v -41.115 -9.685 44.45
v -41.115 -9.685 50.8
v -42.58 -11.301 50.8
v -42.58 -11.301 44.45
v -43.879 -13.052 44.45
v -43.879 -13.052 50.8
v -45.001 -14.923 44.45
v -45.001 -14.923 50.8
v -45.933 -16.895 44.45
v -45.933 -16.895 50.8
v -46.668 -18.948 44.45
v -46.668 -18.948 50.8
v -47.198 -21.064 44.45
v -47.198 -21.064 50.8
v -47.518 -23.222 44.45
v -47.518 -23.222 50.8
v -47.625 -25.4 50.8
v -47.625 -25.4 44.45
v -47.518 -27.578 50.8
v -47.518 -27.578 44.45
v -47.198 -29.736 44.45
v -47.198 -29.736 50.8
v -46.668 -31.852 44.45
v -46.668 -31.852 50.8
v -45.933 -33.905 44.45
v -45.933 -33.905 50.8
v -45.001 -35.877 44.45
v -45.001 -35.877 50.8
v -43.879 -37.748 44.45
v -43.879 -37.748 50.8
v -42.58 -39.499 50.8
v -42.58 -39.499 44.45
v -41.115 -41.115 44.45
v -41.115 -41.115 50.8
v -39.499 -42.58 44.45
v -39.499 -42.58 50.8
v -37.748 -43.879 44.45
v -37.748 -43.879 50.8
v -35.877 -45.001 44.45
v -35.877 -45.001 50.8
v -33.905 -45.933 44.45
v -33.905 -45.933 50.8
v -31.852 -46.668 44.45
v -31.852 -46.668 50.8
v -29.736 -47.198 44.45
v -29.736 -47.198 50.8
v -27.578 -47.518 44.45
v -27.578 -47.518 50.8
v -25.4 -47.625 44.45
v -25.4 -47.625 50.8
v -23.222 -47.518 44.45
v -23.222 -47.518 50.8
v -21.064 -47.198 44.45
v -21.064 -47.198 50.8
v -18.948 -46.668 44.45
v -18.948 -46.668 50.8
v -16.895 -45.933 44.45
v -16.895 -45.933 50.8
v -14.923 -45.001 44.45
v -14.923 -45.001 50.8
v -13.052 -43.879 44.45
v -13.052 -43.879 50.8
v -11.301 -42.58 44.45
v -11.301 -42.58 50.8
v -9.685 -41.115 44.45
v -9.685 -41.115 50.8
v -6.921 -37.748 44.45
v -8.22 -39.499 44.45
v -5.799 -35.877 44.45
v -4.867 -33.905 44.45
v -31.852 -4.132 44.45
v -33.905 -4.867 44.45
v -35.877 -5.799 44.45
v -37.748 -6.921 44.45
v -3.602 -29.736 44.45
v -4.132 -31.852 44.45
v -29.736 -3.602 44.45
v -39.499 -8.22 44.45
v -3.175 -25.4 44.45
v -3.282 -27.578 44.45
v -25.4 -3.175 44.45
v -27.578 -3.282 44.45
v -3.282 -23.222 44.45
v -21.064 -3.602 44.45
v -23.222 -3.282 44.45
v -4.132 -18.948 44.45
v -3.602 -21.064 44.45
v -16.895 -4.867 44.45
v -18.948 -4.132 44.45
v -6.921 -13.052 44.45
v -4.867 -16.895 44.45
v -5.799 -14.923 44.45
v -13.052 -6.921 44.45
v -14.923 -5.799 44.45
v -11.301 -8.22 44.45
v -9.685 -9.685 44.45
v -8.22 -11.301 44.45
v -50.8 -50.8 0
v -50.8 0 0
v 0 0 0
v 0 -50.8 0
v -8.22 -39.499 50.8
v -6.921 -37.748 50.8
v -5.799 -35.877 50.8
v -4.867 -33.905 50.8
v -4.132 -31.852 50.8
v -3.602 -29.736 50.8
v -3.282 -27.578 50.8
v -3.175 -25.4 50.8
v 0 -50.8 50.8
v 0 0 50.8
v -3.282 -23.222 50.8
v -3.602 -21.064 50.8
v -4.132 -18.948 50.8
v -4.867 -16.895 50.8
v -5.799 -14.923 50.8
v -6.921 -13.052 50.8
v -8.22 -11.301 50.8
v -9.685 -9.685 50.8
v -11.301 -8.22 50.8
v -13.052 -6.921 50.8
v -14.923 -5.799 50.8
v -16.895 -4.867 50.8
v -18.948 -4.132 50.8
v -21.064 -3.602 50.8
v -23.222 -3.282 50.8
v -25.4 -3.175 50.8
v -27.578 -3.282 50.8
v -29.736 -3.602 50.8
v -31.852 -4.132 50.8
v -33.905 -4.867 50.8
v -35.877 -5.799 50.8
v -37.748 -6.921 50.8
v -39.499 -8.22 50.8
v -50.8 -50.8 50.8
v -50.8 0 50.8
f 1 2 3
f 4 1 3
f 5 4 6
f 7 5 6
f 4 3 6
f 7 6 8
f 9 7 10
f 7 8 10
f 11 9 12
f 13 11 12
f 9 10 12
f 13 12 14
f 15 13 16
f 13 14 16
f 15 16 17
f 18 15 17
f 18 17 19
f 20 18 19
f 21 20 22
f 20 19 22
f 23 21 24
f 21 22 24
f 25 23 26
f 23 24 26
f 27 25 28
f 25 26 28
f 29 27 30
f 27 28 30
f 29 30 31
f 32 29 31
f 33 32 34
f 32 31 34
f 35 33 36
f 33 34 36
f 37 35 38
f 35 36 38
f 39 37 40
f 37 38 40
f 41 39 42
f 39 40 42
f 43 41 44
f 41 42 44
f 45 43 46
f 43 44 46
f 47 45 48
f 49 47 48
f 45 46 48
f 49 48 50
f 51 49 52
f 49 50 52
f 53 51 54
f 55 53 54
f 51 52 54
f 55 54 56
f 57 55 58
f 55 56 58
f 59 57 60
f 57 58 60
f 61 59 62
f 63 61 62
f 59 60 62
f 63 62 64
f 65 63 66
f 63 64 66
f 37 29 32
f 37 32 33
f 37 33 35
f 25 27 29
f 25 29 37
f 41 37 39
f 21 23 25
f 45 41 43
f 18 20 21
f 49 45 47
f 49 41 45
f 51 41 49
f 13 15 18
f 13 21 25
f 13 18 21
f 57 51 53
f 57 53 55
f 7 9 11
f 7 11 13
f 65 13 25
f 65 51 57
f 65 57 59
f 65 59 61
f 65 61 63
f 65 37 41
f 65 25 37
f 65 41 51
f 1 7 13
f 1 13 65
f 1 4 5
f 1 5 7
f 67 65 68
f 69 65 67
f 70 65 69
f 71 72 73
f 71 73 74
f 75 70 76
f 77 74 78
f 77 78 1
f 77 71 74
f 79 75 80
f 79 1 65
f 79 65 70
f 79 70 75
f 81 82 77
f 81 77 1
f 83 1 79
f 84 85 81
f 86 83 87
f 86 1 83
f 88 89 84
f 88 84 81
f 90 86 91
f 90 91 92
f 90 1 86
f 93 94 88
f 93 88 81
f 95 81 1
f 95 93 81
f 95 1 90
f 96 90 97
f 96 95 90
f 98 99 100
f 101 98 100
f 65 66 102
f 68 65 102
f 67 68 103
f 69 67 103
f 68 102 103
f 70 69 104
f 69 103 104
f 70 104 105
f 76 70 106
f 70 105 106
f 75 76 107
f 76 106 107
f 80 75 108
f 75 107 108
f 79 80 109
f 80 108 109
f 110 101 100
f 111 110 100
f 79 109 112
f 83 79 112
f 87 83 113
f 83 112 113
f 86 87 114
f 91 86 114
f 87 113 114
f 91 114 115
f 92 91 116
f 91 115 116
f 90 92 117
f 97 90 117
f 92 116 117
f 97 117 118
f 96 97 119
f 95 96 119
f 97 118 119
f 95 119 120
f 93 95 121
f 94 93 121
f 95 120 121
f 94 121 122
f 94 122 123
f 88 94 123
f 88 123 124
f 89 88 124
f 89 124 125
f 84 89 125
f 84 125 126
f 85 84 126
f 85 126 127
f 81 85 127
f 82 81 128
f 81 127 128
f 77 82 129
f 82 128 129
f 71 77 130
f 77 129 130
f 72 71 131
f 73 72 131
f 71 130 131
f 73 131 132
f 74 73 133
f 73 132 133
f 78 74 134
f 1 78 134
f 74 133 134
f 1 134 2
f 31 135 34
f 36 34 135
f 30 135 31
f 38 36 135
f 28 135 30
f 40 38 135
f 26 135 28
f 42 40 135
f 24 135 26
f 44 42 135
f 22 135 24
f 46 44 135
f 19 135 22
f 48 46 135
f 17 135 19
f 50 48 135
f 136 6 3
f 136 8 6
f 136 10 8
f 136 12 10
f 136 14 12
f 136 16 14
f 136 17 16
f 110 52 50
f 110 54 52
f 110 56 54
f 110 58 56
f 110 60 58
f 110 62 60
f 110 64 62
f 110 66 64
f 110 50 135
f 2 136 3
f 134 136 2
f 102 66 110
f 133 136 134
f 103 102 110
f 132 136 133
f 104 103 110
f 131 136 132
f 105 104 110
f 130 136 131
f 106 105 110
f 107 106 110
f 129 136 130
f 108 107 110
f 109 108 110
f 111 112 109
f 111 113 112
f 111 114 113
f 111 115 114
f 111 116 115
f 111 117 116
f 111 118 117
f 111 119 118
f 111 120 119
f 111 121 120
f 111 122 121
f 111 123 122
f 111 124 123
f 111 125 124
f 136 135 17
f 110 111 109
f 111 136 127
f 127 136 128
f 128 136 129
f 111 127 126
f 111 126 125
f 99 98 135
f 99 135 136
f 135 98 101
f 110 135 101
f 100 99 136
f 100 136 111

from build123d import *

# Parameters (mm, degrees)
F0_W     = 50.8
F0_H     = 50.8
F1_DEPTH = 50.8
F3_DEPTH = 6.35


with BuildPart() as f1:
    # F0 (on Top) → F1 (new body)
    with BuildSketch(Plane.XY):
        with Locations((-25.4, -25.4)):
            Rectangle(F0_W, F0_H)
    extrude(amount=F1_DEPTH)

    # F2 (on face) → F3 (cut)
    with BuildSketch(Plane.XY.offset(50.8)):
        with BuildLine():
            ThreePointArc((-9.684552, -41.115448), (-4.866777, -33.905139), (-3.175, -25.4))
            ThreePointArc((-3.175, -25.4), (-16.894861, -4.866777), (-41.115448, -9.684552))
            Line((-41.115448, -9.684552), (-9.684552, -41.115448))
        make_face()
        with BuildLine():
            Line((-9.684552, -41.115448), (-41.115448, -9.684552))
            ThreePointArc((-41.115448, -9.684552), (-41.115448, -41.115448), (-9.684552, -41.115448))
        make_face()
    extrude(amount=-F3_DEPTH, mode=Mode.SUBTRACT)


solid = f1.part
